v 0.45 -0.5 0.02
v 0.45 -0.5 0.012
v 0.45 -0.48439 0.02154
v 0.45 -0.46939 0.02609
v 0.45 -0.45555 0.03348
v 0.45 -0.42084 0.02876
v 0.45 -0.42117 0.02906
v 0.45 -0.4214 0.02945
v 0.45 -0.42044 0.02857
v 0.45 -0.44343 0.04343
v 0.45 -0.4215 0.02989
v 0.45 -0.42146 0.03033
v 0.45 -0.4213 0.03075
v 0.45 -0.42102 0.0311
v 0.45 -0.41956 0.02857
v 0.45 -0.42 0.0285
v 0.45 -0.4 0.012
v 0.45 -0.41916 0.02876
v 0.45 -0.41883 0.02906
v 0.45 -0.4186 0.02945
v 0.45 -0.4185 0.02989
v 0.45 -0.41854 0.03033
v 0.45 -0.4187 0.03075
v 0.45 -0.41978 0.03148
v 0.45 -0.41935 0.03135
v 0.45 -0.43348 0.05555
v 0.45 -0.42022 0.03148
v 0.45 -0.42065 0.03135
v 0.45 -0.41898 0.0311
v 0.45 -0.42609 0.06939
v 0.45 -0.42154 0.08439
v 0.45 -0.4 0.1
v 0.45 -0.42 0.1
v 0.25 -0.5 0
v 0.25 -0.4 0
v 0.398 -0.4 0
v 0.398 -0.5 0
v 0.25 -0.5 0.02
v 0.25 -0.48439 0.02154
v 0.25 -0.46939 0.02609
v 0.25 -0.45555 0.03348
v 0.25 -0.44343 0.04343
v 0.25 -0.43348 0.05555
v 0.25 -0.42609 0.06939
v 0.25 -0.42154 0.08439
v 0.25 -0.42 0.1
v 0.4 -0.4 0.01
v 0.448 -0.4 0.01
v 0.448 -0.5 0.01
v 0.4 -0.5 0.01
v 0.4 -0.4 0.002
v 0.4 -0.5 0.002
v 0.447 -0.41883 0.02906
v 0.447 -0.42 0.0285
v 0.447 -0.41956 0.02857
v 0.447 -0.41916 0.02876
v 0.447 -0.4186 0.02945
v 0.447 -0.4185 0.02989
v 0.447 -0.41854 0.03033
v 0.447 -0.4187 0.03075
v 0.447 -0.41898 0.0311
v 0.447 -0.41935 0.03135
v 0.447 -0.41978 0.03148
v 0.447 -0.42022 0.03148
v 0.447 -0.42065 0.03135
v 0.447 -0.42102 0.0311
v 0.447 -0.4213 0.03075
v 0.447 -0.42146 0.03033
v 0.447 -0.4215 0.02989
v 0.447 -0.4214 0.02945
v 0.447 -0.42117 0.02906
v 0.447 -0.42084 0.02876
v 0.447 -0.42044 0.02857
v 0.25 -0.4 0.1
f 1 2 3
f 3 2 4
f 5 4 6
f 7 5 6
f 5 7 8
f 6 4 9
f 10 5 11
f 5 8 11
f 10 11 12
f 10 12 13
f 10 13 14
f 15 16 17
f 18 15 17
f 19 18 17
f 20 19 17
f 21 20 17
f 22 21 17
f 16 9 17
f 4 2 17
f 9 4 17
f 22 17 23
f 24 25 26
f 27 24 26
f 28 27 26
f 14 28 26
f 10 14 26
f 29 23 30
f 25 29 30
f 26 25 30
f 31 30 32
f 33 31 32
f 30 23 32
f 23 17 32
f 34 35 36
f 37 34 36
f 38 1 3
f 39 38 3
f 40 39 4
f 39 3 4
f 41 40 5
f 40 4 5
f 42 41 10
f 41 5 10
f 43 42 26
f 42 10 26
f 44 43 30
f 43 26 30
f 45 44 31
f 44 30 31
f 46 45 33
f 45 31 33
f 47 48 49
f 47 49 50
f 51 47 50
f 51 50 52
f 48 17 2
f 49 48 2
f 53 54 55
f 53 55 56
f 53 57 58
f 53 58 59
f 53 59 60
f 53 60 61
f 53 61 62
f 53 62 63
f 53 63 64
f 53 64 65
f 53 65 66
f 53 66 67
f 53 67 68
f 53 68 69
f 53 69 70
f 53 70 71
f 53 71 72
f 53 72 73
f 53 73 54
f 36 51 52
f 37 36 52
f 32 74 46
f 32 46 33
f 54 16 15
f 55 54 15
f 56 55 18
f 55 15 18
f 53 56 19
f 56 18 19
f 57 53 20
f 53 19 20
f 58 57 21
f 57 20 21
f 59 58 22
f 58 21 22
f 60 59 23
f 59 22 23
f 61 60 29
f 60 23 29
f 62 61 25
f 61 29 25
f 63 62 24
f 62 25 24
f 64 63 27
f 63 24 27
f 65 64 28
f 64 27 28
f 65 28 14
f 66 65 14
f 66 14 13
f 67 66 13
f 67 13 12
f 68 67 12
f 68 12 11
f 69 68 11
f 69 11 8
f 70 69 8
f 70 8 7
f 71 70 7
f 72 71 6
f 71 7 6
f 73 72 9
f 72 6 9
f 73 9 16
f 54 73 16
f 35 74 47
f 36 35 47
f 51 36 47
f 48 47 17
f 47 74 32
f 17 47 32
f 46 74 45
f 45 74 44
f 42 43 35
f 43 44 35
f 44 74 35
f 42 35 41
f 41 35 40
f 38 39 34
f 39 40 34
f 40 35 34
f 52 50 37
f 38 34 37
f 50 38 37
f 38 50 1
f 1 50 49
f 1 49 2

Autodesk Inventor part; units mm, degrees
ref_plane "YZ Plane" through (0, 0, 0) normal (1, 0, 0) x (0, 1, 0)
ref_plane "XZ Plane" through (0, 0, 0) normal (0, 1, 0) x (-1, 0, 0)
sketch "스케치1" plane through (0, 0, 0) normal (0, 0, 1) x (1, 0, 0)
  line L0 (-0.15, 0) -> (0.9, 0) construction
  line L1 (0, -0.7) -> (0, 0.7) construction
  line L2 (0.25, -0.5) -> (0.75, -0.5)
  line L3 (0.75, -0.5) -> (0.75, 0.5)
  line L4 (0.75, 0.5) -> (0.25, 0.5)
  line L5 (0.25, 0.5) -> (0.25, -0.5)
  point P0 (0, 0)
  point P1 (0.5, -0.5)
  dimension "d7" = 0.5
  dimension "d8" = 1
  dimension "d9" = 0.25
extrude "돌출1" add sketch "스케치1" along normal blind 0.1
sketch "스케치3" plane through (0.25, 0.5, 0) normal (0, 1, 0) x (1, 0, 0)
  line L0 (-0.25, 0.7571) -> (-0.25, -0.2929) construction
  line L1 (-0.4, 0) -> (0.65, 0) construction
  line L2 (0.5, 0) -> (0, 0) projected
  line L3 (0, 0) -> (0, -0.1) projected
  line L4 (0.5, -0.1) -> (0, -0.1) projected
  line L5 (0.5, 0) -> (0.5, -0.1) projected
  arc A0 (0, -0.1) -> (0.5, -0.1) centre (0.25, 0.6071) ccw
  line L6 (0.25, -0.1) -> (0.25, 0.4799) construction
  point P0 (-0.25, 0)
  dimension "d10" = 0.75
sketch "스케치5" plane through (0, 0, 0.1) normal (0, 0, 1) x (1, 0, 0)
  line L0 (0.75, -0.5) -> (0.75, 0.5) projected
  line L1 (0.75, 0.5) -> (0.25, 0.5) projected
  line L2 (0.25, 0.5) -> (0.25, -0.5) projected
  line L3 (0.25, -0.5) -> (0.75, -0.5) projected
  line L4 (-0.15, 0) -> (0.9, 0) construction
  line L5 (0, -0.7) -> (0, 0.7) construction
  line L6 (-0.15, 0) -> (0.9, 0) construction
  line L7 (0, 0.7) -> (0, -0.7) construction
  line L8 (0.75, 0.4) -> (0.25, 0.4)
  line L9 (0.75, -0.4) -> (0.25, -0.4)
  point P0 (0, 0)
  dimension "d18" = 1
  dimension "d19" = 0.4
sketch "스케치6" plane through (0.75, -0.5, 0) normal (1, 0, 0) x (0, 0, -1)
  line L0 (0, 0) -> (0, 1) projected
  line L1 (0, 1) -> (-0.1, 1) projected
  line L2 (-0.1, 0) -> (-0.1, 1) projected
  line L3 (0, 0) -> (-0.1, 0) projected
  line L4 (0, 0.5) -> (-0.1, 0.5) construction
  line L5 (0, 0.92) -> (-0.1, 0.92)
  arc A0 (-0.1, 0.92) -> (-0.02, 1) centre (-0.1, 1) ccw
  arc A1 (-0.02, 0) -> (-0.1, 0.08) centre (-0.1, 0) ccw
  point P0 (-0.05, 0.5)
  point P1 (-0.05, 0.92)
  point P2 (-0.02, 0)
  point P3 (-0.1, 0.08)
  dimension "d20" = 0.42
extrude "돌출5" cut sketch "스케치6" against normal up to surface (0.5 mm away) contours L3 L2 A1 | L2 L1 A0
sketch "스케치7" plane through (0.75, -0.5, 0) normal (1, 0, 0) x (0, 0, -1)
  arc A0 (-0.1, 0.92) -> (-0.02, 1) centre (-0.1, 1) ccw projected
  line L0 (-0.1, 0.08) -> (-0.1, 0.92) projected
  arc A1 (-0.02, 0) -> (-0.1, 0.08) centre (-0.1, 0) ccw projected
  line L1 (0, 0) -> (-0.02, 0) projected
  line L2 (0, 0) -> (0, 1) projected
  line L3 (0, 1) -> (-0.02, 1) projected
  line L4 (0, 0.5) -> (-0.2526, 0.5) construction
  line L5 (-0.2526, 0.5) -> (-0.2526, 0.9) construction
  line L6 (-0.2526, 0.9) -> (-0.1, 0.9) construction
  line L7 (-0.2526, 0.1) -> (-0.1, 0.1) construction
  dimension "d23" = 0.4
ref_plane "작업 평면1" through (0.25, -0.4, 0) normal (0, -1, 0) x (1, 0, 0)
sketch "스케치8" plane through (0.25, -0.4, 0) normal (0, -1, 0) x (1, 0, 0)
  line L0 (0, 0.02) -> (0, 0.1) projected
  line L1 (0.5, 0.02) -> (0, 0.02) projected
  line L2 (0.5, 0.1) -> (0.5, 0.02) projected
  line L3 (0, 0.1) -> (0.5, 0.1) projected
  line L4 (0.5, 0.02) -> (0, 0.02) projected
  line L5 (0, 0) -> (0, 0.02) projected
  line L6 (0, 0) -> (0.5, 0) projected
  line L7 (0.5, 0) -> (0.5, 0.02) projected
  point P0 (-0.25, 0)
  point P1 (0.5, 0.02)
  point P2 (0, 0.02)
extrude "돌출6" cut sketch "스케치8" against normal blind 10
sketch "스케치9" plane through (0.25, -0.4, 0) normal (0, 1, 0) x (1, 0, 0)
  line L0 (0.5, 0) -> (0.5, -0.1) projected
  line L1 (0, 0) -> (0.5, 0) projected
  line L2 (0, -0.1) -> (0, 0) projected
  line L3 (0.5, -0.1) -> (0, -0.1) projected
  line L4 (0, 0) -> (0.5, 0) construction
  line L5 (0.2, 0) -> (0.2, -0.1) construction
  line L6 (0.2, -0.1) -> (0.2, -0.0922)
  line L7 (0.2, -0.01) -> (0.15, -0.01)
  line L8 (0.15, -0.01) -> (0.15, 0)
  line L9 (0.4, 0) -> (0.4, -0.1) construction
  line L10 (0.5, -0.1) -> (0, -0.1) construction
  line L11 (0.4, -0.01) -> (0.35, -0.01)
  line L12 (0.35, -0.01) -> (0.35, 0)
  line L13 (0.2, -0.01) -> (0.2, -0.1)
  point P0 (-0.25, 0)
  point P1 (0, -0.05)
  point P2 (0.15, 0)
  dimension "d27" = 0.2
  dimension "d28" = 0.01
  dimension "d29" = 0.2
  dimension "d30" = 0.05
  dimension "d31" = 0.05
extrude "돌출7" cut sketch "스케치9" against normal through all contours L0 L3 L6 L13 L7 L8 L1
chamfer "모따기1" distance 0.002 angle 45 2 edges at (0.45, -0.45, 0.01) (0.4, -0.45, 0)
sketch "스케치10" plane through (0.45, -0.42, 0.1) normal (1, 0, 0) x (0, 0, -1)
  line L0 (0.09, -0.08) -> (0.09, 0.02) projected
  line L1 (0, 0.02) -> (0.088, 0.02) projected
  line L2 (0.09, 0) -> (0.07, 0) construction
  line L3 (0.07, 0) -> (0.07, 0.02) construction
  circle A0 centre (0.07, 0) radius 0.0015
  point P0 (0.1, 0.42)
  dimension "d37" = 0.02
  dimension "d38" = 0.02
  dimension "d39" = 0.003
extrude "돌출8" cut sketch "스케치10" against normal blind 0.003
properties part number "flat_surface_1"
